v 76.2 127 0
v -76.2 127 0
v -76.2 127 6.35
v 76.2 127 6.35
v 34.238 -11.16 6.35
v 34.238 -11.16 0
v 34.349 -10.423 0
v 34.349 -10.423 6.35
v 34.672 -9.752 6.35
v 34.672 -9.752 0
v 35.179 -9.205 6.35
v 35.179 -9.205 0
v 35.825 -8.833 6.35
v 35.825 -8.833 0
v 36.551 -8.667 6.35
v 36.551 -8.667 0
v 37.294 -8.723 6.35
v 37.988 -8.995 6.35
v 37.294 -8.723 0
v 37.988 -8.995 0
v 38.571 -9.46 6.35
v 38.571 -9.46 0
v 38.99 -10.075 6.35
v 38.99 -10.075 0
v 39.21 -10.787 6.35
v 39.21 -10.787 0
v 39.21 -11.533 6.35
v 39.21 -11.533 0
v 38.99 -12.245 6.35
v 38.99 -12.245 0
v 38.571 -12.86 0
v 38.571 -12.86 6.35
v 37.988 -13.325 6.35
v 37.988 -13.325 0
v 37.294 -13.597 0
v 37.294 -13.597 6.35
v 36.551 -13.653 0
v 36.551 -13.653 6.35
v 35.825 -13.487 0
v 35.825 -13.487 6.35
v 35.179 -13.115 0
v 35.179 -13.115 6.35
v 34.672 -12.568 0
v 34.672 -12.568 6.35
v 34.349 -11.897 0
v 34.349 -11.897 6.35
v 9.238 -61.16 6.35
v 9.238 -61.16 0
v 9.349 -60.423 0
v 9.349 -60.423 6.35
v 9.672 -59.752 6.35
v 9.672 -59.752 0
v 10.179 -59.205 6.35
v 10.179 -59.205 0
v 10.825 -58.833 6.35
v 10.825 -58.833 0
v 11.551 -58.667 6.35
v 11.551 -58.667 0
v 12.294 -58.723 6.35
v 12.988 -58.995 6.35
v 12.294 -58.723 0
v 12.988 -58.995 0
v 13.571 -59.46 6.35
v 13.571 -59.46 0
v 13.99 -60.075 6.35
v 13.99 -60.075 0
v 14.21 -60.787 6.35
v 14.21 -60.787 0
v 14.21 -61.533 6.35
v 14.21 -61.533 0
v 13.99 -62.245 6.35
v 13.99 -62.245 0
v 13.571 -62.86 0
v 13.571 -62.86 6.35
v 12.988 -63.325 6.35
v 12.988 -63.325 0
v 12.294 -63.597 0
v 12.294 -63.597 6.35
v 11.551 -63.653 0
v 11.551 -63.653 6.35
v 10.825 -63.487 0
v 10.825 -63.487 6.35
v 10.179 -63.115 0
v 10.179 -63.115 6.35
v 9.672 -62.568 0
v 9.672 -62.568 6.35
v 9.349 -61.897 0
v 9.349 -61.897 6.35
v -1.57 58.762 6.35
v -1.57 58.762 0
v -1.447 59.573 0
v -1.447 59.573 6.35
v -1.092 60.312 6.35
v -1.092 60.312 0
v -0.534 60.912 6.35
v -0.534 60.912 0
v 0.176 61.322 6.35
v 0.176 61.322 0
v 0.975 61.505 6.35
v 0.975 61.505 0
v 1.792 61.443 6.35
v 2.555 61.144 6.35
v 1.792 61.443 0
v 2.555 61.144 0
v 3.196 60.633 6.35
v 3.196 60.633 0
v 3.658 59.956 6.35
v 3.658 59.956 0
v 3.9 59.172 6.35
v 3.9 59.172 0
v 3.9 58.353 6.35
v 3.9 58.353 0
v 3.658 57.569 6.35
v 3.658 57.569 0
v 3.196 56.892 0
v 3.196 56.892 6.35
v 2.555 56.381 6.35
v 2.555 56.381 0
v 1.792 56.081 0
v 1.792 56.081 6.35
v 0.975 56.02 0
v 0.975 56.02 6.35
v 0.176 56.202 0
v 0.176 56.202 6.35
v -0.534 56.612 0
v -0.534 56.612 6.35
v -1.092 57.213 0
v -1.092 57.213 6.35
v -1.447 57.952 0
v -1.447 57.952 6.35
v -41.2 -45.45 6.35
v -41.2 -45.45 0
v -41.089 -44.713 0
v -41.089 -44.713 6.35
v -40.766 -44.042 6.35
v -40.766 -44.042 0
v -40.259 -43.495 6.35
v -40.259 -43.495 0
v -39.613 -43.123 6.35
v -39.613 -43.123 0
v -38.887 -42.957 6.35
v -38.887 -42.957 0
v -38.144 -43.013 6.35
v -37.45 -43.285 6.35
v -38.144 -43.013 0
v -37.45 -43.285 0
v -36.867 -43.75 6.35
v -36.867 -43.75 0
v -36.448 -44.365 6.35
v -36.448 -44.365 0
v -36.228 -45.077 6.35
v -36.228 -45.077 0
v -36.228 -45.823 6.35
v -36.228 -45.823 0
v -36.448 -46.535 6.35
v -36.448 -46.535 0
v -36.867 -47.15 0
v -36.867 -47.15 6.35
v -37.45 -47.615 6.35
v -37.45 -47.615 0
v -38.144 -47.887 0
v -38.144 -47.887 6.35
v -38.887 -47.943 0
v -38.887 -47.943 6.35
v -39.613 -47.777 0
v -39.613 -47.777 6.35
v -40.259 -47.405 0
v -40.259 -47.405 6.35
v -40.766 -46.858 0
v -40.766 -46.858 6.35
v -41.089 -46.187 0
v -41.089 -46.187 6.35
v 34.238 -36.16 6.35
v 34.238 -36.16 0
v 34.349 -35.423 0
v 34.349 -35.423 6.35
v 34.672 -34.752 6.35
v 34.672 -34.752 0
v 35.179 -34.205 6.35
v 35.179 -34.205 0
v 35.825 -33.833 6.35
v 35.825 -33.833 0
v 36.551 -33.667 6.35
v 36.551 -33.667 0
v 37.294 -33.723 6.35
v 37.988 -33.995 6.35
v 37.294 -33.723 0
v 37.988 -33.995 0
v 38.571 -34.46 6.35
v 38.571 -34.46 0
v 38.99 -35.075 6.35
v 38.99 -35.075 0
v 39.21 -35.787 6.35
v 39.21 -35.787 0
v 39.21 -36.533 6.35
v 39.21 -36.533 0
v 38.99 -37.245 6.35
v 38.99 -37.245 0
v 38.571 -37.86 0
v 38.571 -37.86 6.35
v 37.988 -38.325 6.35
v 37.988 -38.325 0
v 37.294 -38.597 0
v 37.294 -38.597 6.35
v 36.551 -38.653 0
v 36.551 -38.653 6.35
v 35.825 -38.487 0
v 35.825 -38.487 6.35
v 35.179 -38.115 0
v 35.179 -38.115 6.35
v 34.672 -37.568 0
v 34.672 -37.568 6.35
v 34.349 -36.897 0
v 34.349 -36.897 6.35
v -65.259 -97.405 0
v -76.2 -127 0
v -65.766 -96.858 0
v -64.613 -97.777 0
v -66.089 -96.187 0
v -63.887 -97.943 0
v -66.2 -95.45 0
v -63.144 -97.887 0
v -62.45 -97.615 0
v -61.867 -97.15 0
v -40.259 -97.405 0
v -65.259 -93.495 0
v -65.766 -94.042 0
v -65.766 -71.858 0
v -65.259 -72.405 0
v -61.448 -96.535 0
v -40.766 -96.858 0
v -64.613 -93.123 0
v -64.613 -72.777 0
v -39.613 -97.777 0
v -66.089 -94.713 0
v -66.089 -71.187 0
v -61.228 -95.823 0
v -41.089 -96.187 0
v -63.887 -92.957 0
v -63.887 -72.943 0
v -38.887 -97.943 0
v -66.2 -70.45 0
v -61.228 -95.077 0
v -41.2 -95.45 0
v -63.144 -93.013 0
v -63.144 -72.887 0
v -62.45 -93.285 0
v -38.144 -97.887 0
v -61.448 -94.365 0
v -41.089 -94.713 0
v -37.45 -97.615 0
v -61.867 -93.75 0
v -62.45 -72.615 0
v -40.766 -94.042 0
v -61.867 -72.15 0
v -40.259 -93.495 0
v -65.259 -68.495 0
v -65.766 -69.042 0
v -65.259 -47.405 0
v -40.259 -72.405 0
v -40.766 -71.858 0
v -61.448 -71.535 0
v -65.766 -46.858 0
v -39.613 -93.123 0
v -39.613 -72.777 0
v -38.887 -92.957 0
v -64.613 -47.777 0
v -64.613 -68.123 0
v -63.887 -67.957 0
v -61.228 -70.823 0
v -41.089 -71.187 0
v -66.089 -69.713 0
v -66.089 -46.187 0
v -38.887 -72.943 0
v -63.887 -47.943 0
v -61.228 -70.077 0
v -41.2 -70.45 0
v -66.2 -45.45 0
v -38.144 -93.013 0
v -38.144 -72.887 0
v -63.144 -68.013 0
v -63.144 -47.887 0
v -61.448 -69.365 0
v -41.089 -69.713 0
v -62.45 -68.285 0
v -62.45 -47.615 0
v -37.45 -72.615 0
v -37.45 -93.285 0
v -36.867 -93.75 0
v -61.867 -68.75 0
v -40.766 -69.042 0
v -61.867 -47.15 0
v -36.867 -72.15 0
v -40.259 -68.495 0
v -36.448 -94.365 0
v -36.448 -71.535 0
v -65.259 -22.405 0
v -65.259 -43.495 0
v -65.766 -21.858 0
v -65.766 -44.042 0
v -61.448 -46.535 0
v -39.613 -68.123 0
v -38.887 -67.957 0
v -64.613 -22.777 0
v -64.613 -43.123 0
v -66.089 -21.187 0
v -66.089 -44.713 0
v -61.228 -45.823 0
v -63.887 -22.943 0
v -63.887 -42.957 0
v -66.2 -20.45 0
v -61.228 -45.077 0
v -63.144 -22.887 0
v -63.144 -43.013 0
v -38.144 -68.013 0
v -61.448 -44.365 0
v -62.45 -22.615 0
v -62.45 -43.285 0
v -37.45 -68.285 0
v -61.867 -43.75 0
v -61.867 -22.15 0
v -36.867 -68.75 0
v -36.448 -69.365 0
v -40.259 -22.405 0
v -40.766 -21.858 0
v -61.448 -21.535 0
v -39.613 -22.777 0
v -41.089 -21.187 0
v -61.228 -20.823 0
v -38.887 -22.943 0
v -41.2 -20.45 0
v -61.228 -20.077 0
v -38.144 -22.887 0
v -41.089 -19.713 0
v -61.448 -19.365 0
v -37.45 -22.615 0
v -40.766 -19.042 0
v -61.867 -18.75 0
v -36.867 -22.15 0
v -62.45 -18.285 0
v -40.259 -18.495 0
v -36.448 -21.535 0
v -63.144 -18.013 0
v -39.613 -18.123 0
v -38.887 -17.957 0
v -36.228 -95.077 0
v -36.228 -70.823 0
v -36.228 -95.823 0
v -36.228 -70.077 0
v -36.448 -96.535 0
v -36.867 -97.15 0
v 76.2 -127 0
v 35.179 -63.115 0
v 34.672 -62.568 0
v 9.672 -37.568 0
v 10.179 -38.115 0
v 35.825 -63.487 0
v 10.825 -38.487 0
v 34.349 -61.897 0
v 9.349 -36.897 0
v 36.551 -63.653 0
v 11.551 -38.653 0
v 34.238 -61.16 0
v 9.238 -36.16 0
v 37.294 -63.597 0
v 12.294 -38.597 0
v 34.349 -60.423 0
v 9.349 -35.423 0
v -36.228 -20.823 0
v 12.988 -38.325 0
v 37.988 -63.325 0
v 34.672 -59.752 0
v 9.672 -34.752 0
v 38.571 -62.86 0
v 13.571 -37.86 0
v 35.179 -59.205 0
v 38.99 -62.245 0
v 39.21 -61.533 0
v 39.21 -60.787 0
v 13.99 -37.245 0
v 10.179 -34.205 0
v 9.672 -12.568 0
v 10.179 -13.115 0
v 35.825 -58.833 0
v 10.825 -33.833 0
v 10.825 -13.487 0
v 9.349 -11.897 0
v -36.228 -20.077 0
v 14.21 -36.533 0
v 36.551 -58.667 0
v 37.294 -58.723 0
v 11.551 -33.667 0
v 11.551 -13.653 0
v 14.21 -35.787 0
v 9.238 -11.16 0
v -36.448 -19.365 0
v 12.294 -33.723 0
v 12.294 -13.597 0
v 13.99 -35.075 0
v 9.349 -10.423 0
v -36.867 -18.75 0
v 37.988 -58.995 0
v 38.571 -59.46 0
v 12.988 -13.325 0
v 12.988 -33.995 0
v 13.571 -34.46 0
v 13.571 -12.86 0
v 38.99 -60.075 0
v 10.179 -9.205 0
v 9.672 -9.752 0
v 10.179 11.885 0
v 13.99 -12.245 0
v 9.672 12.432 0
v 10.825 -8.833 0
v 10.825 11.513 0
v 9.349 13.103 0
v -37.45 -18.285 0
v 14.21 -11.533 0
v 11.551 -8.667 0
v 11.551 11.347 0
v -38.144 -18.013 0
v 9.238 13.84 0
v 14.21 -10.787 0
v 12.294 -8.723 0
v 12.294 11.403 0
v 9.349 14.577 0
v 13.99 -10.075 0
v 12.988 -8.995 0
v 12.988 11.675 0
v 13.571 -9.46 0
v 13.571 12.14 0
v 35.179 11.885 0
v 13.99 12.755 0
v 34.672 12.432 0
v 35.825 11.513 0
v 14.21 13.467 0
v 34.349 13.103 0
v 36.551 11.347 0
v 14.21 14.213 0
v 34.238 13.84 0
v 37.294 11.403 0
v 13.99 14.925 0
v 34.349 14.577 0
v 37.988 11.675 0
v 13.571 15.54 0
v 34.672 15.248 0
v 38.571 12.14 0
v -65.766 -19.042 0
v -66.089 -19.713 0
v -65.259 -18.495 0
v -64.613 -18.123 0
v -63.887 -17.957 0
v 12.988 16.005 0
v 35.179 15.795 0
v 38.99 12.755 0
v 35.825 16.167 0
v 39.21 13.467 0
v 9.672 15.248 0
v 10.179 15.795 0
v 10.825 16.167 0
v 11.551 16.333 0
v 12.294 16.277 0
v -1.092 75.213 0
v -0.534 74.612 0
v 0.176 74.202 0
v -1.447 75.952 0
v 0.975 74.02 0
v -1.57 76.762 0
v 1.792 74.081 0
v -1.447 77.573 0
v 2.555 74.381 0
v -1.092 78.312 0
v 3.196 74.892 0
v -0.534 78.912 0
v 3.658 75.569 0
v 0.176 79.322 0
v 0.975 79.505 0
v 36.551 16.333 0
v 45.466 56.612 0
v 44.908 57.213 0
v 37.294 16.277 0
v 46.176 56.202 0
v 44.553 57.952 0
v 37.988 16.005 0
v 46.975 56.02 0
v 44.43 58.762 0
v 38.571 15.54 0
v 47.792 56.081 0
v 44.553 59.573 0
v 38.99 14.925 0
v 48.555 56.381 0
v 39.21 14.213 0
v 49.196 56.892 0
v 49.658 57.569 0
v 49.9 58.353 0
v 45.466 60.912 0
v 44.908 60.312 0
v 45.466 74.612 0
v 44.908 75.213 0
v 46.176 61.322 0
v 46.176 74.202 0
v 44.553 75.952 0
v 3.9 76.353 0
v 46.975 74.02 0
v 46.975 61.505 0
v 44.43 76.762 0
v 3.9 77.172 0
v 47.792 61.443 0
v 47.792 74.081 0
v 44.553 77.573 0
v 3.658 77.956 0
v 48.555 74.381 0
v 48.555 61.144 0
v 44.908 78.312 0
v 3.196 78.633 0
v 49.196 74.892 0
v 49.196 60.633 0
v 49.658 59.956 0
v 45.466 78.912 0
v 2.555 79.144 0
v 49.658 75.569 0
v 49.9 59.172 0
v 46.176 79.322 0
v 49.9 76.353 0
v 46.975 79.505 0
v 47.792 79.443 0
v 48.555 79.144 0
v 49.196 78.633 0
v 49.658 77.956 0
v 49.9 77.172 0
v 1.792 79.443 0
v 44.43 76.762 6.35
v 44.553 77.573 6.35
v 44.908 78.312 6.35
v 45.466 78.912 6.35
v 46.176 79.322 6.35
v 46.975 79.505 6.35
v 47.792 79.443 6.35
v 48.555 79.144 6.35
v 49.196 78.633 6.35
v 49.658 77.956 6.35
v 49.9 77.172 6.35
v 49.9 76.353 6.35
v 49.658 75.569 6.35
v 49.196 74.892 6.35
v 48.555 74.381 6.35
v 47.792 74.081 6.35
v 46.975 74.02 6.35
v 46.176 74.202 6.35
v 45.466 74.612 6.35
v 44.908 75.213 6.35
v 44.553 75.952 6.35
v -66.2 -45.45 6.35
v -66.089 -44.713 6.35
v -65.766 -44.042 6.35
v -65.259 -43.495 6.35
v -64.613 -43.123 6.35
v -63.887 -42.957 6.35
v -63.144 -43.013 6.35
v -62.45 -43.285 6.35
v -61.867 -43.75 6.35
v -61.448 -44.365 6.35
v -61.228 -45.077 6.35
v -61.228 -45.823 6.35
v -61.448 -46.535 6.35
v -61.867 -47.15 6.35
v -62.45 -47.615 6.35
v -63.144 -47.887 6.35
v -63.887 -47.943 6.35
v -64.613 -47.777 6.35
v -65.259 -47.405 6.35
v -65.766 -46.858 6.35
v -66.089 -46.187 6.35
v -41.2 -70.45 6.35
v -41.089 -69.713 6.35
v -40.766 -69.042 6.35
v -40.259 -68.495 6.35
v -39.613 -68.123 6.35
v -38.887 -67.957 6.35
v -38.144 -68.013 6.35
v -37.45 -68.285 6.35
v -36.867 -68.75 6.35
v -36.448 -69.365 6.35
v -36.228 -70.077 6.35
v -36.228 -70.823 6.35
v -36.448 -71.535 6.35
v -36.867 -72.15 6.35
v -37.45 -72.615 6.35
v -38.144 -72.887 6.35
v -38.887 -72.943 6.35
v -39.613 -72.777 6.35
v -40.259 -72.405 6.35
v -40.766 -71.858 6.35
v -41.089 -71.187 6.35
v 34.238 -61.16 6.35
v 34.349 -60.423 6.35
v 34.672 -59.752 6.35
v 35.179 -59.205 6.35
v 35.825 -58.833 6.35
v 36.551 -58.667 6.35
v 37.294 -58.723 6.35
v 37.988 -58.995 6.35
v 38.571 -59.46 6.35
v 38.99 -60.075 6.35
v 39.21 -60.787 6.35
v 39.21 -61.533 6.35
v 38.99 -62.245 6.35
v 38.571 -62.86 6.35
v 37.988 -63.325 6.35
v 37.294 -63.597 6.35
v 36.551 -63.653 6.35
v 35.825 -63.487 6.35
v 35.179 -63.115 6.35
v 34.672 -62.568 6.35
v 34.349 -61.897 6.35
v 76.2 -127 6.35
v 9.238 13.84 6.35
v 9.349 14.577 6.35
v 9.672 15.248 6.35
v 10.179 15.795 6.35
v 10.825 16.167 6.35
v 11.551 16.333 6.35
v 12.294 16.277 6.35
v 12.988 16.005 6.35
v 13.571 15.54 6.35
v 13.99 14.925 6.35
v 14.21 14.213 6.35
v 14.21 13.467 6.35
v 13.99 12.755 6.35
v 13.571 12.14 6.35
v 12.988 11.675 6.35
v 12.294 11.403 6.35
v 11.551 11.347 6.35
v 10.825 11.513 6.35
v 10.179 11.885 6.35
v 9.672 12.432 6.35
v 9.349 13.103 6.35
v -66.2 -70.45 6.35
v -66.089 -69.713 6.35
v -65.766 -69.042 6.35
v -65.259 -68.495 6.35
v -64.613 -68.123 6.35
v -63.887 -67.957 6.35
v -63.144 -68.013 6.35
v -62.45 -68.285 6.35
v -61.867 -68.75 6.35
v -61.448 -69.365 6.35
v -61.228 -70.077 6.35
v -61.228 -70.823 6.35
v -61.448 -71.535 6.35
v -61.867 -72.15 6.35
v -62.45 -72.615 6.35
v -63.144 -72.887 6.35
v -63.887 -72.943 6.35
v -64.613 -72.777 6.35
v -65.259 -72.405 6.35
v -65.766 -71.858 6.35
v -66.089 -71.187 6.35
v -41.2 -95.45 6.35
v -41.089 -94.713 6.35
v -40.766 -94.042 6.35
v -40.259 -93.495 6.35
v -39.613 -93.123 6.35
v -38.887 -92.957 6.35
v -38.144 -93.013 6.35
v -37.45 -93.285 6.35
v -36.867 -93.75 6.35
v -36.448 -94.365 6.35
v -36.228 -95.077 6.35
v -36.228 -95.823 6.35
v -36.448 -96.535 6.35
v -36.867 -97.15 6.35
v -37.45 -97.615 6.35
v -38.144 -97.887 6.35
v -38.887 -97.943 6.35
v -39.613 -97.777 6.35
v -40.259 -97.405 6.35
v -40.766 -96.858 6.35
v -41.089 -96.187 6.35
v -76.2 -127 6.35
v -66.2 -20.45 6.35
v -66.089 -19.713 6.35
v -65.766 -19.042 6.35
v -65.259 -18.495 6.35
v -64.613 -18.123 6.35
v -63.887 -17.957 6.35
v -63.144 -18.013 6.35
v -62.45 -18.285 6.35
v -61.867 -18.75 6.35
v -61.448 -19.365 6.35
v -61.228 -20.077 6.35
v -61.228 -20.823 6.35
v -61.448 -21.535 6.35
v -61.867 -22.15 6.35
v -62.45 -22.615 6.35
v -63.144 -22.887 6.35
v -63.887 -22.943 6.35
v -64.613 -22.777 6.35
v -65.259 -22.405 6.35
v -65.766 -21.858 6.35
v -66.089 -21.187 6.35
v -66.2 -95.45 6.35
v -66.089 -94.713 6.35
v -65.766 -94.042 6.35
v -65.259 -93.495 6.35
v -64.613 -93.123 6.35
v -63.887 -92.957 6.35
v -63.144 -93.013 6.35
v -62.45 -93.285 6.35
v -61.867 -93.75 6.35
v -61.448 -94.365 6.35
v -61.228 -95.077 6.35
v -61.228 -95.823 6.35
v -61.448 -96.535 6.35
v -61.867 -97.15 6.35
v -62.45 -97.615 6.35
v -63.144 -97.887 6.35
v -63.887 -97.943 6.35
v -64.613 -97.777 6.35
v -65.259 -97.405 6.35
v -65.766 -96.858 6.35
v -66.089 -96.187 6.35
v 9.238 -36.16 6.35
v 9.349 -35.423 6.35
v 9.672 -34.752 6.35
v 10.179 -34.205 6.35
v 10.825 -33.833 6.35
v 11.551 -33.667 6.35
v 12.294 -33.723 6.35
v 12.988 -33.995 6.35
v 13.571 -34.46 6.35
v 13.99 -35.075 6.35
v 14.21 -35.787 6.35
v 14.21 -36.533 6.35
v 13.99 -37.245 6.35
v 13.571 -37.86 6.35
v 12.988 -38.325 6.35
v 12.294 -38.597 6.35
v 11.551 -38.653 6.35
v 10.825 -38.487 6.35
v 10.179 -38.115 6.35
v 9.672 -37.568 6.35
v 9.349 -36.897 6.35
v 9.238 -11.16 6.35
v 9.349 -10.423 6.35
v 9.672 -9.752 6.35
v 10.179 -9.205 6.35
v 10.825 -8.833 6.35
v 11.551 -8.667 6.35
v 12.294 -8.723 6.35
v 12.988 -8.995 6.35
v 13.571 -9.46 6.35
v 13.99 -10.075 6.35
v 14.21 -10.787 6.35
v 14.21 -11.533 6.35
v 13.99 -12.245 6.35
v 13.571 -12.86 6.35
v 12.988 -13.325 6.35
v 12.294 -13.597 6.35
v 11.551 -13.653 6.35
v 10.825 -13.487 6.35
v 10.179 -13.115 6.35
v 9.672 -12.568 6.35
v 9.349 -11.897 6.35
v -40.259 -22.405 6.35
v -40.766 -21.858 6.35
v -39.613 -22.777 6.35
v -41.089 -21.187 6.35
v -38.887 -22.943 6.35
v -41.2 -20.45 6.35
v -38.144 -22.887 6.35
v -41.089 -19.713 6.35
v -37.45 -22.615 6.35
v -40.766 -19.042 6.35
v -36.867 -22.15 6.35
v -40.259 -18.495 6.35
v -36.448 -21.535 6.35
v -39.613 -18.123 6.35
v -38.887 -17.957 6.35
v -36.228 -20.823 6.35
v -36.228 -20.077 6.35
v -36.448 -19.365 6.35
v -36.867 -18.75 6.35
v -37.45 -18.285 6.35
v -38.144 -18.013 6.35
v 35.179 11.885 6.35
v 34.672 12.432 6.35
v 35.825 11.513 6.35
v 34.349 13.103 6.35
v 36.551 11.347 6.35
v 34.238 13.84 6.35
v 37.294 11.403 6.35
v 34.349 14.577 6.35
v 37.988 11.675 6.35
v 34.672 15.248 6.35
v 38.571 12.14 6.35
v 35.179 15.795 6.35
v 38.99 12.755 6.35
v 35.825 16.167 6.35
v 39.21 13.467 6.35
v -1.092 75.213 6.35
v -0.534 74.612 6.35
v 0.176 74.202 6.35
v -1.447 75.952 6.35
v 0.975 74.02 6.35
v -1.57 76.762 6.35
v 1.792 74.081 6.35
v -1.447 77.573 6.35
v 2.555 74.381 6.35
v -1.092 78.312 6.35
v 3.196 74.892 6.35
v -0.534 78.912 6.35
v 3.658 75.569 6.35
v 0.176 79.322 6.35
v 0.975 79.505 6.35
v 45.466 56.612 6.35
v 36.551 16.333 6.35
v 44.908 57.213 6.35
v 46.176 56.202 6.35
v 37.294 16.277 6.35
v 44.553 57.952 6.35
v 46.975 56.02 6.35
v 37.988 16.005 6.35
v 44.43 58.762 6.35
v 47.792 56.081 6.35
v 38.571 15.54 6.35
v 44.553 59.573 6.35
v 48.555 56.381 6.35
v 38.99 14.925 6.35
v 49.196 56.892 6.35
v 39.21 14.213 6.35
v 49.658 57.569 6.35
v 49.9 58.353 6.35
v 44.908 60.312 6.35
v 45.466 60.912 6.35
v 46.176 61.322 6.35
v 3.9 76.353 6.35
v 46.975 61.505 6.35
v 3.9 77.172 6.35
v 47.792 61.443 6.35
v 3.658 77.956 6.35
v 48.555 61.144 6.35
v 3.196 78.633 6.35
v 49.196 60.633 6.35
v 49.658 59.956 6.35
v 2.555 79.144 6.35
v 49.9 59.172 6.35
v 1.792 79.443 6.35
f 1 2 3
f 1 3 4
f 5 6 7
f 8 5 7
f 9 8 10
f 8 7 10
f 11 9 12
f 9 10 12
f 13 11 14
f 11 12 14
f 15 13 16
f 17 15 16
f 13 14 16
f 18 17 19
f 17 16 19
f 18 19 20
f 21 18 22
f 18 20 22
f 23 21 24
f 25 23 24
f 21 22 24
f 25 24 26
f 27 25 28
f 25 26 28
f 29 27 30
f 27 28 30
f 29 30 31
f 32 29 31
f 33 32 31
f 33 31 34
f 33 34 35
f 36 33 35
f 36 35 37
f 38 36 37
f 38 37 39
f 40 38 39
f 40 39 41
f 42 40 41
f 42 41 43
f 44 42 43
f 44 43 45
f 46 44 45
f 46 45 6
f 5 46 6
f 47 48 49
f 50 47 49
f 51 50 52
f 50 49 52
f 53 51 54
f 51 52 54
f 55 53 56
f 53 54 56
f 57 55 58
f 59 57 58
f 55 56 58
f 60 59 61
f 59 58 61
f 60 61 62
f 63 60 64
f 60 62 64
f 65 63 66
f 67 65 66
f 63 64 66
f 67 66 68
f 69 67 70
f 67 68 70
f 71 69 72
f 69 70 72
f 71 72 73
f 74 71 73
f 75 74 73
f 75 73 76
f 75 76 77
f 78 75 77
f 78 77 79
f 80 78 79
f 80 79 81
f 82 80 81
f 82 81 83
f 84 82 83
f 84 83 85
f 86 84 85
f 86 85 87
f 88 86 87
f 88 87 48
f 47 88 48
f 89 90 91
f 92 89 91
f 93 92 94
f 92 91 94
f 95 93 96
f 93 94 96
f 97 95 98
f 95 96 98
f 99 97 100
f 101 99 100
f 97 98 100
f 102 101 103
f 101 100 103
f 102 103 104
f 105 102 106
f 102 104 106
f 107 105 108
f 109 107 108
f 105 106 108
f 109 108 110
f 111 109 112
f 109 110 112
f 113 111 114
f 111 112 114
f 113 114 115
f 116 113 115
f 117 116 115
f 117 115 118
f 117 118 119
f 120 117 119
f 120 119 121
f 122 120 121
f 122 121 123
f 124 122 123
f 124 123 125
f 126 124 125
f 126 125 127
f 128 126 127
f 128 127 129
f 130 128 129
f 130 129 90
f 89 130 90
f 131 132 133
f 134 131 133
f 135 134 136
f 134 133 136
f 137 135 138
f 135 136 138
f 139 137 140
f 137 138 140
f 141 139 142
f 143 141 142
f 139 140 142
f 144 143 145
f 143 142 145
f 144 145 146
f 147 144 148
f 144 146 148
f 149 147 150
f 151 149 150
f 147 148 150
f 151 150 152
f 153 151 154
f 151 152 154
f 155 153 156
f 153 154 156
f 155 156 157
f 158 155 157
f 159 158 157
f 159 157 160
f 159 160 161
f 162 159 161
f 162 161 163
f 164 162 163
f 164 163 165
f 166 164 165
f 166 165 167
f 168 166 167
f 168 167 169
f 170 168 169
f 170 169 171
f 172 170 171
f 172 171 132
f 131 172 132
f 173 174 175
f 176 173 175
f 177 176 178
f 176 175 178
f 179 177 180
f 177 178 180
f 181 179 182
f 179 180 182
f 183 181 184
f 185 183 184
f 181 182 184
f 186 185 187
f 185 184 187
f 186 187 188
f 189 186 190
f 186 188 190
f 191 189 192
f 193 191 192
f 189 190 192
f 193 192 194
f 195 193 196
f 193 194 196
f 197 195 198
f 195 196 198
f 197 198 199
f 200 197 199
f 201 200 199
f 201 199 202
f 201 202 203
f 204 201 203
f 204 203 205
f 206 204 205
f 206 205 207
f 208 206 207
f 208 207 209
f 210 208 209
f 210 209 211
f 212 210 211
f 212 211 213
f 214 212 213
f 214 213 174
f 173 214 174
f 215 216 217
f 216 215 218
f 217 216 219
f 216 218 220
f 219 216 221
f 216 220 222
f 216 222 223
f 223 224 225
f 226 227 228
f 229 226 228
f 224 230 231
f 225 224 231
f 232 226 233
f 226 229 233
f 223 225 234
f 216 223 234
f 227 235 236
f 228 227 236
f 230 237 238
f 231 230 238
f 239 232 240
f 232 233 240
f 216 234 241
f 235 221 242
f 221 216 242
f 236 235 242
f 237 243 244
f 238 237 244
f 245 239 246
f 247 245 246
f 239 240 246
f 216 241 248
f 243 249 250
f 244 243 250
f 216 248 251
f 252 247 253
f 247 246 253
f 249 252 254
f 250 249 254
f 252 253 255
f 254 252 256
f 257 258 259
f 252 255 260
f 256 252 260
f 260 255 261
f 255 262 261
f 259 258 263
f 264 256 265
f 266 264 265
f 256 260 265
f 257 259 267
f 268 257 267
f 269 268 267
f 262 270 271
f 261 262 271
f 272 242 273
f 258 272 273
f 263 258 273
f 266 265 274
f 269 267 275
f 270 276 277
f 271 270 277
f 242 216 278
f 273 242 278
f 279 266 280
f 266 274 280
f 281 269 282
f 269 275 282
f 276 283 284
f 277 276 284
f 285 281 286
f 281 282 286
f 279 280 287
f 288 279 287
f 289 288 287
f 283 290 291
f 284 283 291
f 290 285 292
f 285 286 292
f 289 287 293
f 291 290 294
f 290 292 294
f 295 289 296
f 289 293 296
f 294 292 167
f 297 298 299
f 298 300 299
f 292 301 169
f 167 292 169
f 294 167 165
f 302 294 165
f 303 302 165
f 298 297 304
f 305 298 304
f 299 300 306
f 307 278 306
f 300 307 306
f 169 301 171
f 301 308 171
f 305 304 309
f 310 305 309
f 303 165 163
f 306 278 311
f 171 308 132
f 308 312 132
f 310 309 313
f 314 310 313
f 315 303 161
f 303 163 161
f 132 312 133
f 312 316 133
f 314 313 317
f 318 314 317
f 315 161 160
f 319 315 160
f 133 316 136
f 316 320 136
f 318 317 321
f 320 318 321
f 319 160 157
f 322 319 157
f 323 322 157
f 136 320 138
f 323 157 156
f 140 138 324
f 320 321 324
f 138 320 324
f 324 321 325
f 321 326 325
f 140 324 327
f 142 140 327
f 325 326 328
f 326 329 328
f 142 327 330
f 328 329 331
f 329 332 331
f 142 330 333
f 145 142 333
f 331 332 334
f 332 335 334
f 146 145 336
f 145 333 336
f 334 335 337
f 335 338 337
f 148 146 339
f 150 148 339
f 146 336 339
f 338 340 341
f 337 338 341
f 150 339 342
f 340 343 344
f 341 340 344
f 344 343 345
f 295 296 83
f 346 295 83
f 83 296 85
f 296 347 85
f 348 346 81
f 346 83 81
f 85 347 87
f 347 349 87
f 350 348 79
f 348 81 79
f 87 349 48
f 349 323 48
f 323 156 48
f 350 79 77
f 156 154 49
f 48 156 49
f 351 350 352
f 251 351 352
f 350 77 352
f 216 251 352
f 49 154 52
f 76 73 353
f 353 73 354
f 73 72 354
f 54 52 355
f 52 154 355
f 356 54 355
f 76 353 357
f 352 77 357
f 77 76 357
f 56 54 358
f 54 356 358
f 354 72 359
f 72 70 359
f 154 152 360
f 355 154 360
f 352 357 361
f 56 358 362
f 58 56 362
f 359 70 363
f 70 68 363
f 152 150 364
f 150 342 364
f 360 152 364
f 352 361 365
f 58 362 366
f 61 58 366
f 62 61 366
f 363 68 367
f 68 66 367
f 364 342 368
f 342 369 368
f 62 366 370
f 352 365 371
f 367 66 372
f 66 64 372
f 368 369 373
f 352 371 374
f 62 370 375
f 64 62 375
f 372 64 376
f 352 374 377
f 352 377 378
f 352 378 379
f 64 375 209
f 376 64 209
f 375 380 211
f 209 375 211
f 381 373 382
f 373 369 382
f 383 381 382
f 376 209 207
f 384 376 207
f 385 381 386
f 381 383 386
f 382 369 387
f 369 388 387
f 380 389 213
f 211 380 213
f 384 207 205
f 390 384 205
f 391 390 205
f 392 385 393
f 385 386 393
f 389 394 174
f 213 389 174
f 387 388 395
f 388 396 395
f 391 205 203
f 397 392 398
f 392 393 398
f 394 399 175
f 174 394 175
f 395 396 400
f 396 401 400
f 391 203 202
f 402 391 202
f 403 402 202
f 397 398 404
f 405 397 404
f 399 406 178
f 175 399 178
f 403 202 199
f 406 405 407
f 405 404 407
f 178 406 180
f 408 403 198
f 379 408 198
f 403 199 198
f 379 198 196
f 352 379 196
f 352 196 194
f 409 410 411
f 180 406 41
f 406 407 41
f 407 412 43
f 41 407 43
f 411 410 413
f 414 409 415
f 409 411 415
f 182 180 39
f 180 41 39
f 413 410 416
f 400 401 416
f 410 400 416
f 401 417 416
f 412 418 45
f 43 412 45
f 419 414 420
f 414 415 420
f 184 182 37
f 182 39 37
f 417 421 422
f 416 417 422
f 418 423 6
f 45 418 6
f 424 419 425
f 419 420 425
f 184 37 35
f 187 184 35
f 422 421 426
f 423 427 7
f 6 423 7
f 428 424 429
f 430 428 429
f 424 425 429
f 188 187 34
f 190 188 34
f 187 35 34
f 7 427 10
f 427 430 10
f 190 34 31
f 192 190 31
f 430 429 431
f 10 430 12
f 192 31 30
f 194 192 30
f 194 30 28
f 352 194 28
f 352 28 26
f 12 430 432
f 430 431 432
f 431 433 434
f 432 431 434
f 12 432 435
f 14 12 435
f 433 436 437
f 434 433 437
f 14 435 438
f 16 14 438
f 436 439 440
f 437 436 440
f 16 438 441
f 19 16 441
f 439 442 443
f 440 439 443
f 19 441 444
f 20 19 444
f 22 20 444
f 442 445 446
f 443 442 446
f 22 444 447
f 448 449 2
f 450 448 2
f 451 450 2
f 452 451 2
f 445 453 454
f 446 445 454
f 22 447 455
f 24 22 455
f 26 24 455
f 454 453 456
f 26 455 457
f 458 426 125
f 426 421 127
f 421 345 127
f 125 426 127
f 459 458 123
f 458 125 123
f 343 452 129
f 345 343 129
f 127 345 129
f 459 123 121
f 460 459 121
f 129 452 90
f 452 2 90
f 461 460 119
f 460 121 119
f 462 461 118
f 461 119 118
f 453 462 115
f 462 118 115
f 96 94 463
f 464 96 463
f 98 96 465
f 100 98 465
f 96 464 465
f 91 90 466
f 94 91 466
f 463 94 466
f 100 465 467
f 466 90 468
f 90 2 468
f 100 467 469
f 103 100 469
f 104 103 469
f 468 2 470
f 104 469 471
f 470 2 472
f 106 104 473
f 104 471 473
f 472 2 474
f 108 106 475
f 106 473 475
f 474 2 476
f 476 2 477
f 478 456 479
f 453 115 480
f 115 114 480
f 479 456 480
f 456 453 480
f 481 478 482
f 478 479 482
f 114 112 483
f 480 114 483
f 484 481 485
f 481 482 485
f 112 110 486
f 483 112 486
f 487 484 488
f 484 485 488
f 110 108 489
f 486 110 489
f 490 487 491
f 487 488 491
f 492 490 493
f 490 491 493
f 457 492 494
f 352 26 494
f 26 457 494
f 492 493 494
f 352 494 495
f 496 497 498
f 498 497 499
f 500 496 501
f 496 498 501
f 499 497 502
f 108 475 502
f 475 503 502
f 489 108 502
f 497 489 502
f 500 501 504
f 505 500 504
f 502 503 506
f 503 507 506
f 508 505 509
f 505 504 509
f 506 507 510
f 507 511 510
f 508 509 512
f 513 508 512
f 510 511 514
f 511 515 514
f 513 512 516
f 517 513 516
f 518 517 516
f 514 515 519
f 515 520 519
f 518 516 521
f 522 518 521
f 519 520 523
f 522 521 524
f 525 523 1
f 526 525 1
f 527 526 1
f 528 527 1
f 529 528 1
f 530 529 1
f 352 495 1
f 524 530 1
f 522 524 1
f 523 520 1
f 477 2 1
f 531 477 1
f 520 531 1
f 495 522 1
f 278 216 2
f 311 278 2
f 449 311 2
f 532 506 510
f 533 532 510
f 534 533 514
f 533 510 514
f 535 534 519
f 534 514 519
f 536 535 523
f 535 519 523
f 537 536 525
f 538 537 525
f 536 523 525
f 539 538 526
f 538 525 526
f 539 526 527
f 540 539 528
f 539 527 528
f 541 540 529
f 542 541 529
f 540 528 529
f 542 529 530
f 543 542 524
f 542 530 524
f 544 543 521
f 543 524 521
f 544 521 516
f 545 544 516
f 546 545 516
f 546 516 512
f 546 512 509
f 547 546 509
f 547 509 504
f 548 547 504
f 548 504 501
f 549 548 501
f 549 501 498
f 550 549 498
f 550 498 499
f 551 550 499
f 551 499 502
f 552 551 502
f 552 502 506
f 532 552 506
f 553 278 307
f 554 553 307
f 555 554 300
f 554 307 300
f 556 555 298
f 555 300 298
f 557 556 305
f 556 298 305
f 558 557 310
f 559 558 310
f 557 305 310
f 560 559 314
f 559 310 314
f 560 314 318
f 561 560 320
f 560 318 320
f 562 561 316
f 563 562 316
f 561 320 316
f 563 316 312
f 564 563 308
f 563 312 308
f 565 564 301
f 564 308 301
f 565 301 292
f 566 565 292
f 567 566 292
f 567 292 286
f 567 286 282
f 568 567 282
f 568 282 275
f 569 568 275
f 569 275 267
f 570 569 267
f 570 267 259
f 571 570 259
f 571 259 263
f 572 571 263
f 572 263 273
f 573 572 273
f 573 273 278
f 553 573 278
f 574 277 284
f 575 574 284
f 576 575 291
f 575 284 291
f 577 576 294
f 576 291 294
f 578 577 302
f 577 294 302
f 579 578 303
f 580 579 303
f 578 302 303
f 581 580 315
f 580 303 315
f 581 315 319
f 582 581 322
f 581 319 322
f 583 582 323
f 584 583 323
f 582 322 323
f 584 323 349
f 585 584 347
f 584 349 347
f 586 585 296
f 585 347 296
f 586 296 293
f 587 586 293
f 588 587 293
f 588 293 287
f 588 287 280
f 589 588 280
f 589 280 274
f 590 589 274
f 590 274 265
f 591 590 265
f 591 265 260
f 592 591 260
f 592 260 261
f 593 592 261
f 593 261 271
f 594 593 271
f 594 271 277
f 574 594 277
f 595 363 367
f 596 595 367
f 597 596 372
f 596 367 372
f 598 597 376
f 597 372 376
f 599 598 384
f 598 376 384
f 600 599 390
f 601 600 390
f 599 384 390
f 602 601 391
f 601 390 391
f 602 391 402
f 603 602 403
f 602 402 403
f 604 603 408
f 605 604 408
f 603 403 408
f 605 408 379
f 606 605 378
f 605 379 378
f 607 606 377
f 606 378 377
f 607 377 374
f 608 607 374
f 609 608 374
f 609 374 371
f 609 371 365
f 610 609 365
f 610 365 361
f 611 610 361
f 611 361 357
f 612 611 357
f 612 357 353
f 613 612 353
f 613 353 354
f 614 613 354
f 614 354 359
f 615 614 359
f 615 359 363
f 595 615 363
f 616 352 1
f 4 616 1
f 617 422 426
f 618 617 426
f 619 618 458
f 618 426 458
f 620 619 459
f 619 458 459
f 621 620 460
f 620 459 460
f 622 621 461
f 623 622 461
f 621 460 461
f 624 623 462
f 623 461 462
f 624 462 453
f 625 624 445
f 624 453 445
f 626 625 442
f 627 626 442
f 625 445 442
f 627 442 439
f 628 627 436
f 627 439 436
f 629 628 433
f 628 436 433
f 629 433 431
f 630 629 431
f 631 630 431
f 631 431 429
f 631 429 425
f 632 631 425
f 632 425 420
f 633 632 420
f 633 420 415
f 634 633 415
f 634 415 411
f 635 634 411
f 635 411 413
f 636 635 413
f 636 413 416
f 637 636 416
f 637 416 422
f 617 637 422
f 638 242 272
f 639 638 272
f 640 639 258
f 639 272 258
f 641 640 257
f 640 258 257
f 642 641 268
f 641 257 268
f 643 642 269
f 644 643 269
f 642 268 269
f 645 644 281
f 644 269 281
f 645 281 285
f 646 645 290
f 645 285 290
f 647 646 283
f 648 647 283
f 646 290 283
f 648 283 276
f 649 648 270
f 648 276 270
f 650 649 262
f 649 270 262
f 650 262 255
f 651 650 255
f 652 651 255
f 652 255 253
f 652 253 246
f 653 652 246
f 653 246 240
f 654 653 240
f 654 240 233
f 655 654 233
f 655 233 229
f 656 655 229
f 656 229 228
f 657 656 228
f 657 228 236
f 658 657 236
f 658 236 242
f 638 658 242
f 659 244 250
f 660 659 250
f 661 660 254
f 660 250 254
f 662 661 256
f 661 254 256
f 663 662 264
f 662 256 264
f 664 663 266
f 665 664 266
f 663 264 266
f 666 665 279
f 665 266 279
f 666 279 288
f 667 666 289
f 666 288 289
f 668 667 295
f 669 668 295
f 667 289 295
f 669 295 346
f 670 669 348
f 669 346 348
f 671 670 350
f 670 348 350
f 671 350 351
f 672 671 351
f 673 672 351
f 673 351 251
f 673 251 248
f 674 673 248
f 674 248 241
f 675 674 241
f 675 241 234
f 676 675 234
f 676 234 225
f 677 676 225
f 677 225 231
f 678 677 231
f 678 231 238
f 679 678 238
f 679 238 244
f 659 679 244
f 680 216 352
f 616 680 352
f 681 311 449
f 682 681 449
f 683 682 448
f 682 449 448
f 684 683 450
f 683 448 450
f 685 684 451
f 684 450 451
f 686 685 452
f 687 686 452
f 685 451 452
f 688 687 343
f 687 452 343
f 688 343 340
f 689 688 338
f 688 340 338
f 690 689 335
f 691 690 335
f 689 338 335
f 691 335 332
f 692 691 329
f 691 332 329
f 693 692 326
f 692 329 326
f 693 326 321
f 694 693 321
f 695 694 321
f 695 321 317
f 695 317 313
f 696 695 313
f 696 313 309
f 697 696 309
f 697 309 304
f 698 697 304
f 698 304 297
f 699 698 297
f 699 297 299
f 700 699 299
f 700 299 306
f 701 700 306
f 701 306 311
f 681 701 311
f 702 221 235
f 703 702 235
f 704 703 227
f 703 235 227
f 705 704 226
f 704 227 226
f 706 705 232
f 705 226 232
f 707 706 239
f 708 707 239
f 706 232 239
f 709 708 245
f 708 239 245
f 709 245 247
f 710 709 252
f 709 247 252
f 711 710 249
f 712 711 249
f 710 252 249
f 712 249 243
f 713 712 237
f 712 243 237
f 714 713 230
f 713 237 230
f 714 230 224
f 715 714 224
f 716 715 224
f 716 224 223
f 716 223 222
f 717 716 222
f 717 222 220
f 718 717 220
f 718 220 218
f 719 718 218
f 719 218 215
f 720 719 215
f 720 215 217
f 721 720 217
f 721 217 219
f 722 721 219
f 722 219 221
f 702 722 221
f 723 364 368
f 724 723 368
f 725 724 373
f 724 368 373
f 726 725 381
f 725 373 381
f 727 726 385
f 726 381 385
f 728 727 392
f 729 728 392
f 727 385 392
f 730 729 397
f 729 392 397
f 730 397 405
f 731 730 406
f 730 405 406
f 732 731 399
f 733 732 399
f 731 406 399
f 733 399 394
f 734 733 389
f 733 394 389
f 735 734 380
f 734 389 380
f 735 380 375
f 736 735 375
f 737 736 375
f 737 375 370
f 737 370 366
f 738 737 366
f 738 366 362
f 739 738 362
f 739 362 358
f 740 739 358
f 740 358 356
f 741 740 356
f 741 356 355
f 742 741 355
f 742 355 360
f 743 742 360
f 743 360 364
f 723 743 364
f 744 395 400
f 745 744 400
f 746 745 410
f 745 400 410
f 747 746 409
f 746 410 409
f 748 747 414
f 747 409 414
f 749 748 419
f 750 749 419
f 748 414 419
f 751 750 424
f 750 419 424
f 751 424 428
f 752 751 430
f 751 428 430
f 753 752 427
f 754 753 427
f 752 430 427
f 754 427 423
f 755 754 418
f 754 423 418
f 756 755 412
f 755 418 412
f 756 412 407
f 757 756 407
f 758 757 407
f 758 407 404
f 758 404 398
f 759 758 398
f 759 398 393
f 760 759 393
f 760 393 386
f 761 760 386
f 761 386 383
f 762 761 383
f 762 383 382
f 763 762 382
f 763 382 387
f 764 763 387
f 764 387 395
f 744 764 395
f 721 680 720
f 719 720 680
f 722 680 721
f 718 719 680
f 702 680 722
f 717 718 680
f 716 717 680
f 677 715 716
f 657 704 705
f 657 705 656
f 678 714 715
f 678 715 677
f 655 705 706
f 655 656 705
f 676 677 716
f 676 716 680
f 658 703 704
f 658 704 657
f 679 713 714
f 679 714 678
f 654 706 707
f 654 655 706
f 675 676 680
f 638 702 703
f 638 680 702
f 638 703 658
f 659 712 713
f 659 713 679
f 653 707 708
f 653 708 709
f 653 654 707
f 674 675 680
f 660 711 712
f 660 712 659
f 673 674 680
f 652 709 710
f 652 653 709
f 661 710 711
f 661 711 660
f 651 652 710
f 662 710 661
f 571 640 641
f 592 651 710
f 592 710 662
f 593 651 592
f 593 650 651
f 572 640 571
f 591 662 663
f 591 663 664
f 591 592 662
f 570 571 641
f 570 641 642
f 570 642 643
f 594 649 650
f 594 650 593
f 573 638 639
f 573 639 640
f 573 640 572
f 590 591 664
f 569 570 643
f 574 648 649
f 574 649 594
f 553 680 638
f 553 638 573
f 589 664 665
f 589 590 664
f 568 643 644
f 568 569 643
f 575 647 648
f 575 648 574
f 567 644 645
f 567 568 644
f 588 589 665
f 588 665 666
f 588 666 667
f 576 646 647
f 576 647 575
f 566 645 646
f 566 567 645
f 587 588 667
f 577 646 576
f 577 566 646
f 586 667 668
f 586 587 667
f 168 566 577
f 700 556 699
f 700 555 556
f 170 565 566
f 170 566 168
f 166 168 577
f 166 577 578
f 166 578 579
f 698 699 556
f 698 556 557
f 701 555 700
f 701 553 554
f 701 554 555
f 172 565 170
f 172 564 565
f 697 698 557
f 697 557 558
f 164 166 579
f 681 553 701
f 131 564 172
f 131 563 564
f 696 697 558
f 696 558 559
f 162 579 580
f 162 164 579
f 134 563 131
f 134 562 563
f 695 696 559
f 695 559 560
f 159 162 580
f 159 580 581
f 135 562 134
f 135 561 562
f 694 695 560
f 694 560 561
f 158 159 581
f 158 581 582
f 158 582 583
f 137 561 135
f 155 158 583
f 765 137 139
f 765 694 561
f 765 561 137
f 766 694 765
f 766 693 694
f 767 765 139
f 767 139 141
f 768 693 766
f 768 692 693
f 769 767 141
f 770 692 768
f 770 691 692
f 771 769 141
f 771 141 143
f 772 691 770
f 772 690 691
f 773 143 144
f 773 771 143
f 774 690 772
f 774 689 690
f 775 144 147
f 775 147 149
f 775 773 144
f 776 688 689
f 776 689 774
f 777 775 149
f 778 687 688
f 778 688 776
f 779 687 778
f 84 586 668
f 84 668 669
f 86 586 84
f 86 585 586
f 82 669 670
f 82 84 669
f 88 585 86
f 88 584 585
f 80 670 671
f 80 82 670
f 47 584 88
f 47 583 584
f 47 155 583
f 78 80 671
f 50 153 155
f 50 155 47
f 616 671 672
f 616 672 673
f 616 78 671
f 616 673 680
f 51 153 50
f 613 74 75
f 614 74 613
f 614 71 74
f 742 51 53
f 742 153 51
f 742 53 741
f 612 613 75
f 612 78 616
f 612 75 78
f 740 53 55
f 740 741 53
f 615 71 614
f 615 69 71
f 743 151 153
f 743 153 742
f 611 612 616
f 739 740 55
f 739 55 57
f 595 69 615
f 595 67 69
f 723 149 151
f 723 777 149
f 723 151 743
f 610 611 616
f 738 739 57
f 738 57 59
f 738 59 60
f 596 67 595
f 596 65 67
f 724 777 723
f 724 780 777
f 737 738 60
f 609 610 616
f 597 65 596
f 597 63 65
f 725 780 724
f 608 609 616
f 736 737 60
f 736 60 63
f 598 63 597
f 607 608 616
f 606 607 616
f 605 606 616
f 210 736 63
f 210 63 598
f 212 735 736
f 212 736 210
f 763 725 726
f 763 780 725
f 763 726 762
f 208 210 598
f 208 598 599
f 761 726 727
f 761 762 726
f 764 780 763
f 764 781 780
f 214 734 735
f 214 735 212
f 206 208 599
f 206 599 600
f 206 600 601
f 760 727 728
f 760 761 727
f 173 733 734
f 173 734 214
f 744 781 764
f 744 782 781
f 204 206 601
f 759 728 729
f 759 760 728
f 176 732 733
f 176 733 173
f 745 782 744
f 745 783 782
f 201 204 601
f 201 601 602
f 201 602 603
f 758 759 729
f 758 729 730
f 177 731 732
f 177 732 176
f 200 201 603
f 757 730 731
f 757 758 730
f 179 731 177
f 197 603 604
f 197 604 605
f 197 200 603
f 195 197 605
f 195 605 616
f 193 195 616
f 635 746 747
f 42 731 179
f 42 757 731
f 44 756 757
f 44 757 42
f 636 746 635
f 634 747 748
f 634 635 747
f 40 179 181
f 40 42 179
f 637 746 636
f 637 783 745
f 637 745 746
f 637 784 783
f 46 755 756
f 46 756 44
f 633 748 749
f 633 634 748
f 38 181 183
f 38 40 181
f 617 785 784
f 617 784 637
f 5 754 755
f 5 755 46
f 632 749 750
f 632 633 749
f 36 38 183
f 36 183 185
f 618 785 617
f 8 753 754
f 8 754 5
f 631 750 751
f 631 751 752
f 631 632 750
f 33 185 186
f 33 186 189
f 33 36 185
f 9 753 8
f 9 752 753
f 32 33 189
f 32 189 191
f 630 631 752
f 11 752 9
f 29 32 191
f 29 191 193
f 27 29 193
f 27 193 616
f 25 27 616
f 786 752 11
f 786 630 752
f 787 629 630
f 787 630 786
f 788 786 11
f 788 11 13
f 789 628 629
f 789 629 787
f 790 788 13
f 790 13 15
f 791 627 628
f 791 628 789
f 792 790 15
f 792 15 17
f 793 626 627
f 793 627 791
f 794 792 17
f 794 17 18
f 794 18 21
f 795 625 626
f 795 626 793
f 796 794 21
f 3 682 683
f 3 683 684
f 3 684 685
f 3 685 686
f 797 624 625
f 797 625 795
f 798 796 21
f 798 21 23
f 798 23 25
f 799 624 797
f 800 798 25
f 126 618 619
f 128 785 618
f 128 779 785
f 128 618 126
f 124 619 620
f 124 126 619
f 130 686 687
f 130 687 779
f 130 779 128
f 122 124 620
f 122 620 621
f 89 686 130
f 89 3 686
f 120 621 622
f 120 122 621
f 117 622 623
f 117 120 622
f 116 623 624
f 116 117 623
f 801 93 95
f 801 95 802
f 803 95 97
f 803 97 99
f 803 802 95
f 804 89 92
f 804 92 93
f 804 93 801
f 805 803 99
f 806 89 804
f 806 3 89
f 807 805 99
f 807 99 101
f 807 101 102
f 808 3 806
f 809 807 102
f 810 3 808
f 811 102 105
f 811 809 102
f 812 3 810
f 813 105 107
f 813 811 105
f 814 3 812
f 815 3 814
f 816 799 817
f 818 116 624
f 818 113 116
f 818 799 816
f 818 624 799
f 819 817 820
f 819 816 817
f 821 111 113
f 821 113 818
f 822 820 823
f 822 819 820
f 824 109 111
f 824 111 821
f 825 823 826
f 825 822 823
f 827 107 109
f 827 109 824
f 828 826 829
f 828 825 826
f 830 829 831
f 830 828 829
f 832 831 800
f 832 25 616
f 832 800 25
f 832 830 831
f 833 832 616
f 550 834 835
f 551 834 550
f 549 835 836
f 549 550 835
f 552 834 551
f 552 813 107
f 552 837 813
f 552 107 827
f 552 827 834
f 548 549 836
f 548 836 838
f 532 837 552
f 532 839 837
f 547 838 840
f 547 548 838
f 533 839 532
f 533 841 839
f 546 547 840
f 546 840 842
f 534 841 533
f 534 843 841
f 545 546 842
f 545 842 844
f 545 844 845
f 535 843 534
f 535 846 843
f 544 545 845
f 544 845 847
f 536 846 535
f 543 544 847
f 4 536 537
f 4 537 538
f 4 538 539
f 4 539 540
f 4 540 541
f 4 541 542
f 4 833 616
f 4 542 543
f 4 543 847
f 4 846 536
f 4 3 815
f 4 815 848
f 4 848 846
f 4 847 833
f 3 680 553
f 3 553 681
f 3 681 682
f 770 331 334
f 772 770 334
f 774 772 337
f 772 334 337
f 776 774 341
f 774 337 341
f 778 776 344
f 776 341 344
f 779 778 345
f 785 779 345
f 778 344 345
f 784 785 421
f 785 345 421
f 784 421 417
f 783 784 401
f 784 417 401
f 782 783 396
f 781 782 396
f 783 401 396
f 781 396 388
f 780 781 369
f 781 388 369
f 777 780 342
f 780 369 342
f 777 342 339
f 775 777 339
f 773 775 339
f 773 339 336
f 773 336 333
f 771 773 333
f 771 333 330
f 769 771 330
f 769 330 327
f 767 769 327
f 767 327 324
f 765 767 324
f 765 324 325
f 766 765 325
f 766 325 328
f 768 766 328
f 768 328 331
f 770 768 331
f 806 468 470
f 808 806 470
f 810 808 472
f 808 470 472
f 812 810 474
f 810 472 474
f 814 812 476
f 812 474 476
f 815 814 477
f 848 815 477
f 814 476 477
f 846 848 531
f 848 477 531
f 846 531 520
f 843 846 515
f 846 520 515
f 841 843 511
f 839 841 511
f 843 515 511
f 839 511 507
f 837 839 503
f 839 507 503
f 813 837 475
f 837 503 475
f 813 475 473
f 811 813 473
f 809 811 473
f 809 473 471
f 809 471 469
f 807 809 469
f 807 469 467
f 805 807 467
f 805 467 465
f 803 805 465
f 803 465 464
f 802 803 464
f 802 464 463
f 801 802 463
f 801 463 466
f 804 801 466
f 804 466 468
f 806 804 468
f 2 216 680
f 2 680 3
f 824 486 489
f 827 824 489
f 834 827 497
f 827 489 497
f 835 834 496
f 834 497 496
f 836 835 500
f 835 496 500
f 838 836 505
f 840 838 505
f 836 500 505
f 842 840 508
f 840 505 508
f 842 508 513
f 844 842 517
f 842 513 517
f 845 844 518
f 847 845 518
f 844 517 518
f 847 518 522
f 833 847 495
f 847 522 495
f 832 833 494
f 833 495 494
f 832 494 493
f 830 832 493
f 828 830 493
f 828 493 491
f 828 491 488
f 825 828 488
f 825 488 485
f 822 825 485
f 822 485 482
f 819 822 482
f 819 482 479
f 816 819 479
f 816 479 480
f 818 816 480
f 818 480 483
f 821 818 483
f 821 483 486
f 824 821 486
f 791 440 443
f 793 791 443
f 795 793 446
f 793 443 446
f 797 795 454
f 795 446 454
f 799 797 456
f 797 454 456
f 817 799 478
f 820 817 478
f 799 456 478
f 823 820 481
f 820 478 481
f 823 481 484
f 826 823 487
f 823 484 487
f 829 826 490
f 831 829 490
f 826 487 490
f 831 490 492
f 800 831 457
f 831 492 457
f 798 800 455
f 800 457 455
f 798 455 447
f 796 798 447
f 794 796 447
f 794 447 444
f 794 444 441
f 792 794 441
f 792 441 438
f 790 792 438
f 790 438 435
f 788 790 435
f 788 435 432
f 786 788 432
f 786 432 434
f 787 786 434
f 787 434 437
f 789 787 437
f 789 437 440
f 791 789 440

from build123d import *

# Parameters (mm, degrees)
SKETCH1_W           = 152.4
SKETCH1_H           = 254
BOSS_EXTRUDE1_DEPTH = 6.35
CUT_EXTRUDE2_REACH  = 150.242
SKETCH3_R           = 2.5
CUT_EXTRUDE3_REACH  = 150.242
SKETCH4_R           = 2.75


with BuildPart() as part:
    # Sketch1 → Boss-Extrude1 (new body)
    with BuildSketch(Plane.XY):
        Rectangle(SKETCH1_W, SKETCH1_H)
    extrude(amount=BOSS_EXTRUDE1_DEPTH)

    # Sketch3 → Cut-Extrude2 (cut, up to next)
    with BuildSketch(Plane(origin=(0, 0, 0), x_dir=(-1, 0, 0), z_dir=(0, 0, -1)), mode=Mode.PRIVATE) as cut_extrude2_sk1:
        with Locations((63.7, -20.45)):
            Circle(SKETCH3_R)
    cut_extrude2_tool1 = extrude(cut_extrude2_sk1.sketch, amount=-CUT_EXTRUDE2_REACH, mode=Mode.PRIVATE) & part.part
    # Sketch3 → Cut-Extrude2 (cut, up to next)
    with BuildSketch(Plane(origin=(0, 0, 0), x_dir=(-1, 0, 0), z_dir=(0, 0, -1)), mode=Mode.PRIVATE) as cut_extrude2_sk2:
        with Locations((38.7, -20.45)):
            Circle(SKETCH3_R)
    cut_extrude2_tool2 = extrude(cut_extrude2_sk2.sketch, amount=-CUT_EXTRUDE2_REACH, mode=Mode.PRIVATE) & part.part
    # Sketch3 → Cut-Extrude2 (cut, up to next)
    with BuildSketch(Plane(origin=(0, 0, 0), x_dir=(-1, 0, 0), z_dir=(0, 0, -1)), mode=Mode.PRIVATE) as cut_extrude2_sk3:
        with Locations((38.7, -45.45)):
            Circle(SKETCH3_R)
    cut_extrude2_tool3 = extrude(cut_extrude2_sk3.sketch, amount=-CUT_EXTRUDE2_REACH, mode=Mode.PRIVATE) & part.part
    # Sketch3 → Cut-Extrude2 (cut, up to next)
    with BuildSketch(Plane(origin=(0, 0, 0), x_dir=(-1, 0, 0), z_dir=(0, 0, -1)), mode=Mode.PRIVATE) as cut_extrude2_sk4:
        with Locations((63.7, -45.45)):
            Circle(SKETCH3_R)
    cut_extrude2_tool4 = extrude(cut_extrude2_sk4.sketch, amount=-CUT_EXTRUDE2_REACH, mode=Mode.PRIVATE) & part.part
    # Sketch3 → Cut-Extrude2 (cut, up to next)
    with BuildSketch(Plane(origin=(0, 0, 0), x_dir=(-1, 0, 0), z_dir=(0, 0, -1)), mode=Mode.PRIVATE) as cut_extrude2_sk5:
        with Locations((63.7, -70.45)):
            Circle(SKETCH3_R)
    cut_extrude2_tool5 = extrude(cut_extrude2_sk5.sketch, amount=-CUT_EXTRUDE2_REACH, mode=Mode.PRIVATE) & part.part
    # Sketch3 → Cut-Extrude2 (cut, up to next)
    with BuildSketch(Plane(origin=(0, 0, 0), x_dir=(-1, 0, 0), z_dir=(0, 0, -1)), mode=Mode.PRIVATE) as cut_extrude2_sk6:
        with Locations((38.7, -70.45)):
            Circle(SKETCH3_R)
    cut_extrude2_tool6 = extrude(cut_extrude2_sk6.sketch, amount=-CUT_EXTRUDE2_REACH, mode=Mode.PRIVATE) & part.part
    # Sketch3 → Cut-Extrude2 (cut, up to next)
    with BuildSketch(Plane(origin=(0, 0, 0), x_dir=(-1, 0, 0), z_dir=(0, 0, -1)), mode=Mode.PRIVATE) as cut_extrude2_sk7:
        with Locations((38.7, -95.45)):
            Circle(SKETCH3_R)
    cut_extrude2_tool7 = extrude(cut_extrude2_sk7.sketch, amount=-CUT_EXTRUDE2_REACH, mode=Mode.PRIVATE) & part.part
    # Sketch3 → Cut-Extrude2 (cut, up to next)
    with BuildSketch(Plane(origin=(0, 0, 0), x_dir=(-1, 0, 0), z_dir=(0, 0, -1)), mode=Mode.PRIVATE) as cut_extrude2_sk8:
        with Locations((63.7, -95.45)):
            Circle(SKETCH3_R)
    cut_extrude2_tool8 = extrude(cut_extrude2_sk8.sketch, amount=-CUT_EXTRUDE2_REACH, mode=Mode.PRIVATE) & part.part
    # Sketch3 → Cut-Extrude2 (cut, up to next)
    with BuildSketch(Plane(origin=(0, 0, 0), x_dir=(-1, 0, 0), z_dir=(0, 0, -1)), mode=Mode.PRIVATE) as cut_extrude2_sk9:
        with Locations((-11.738, -61.16)):
            Circle(SKETCH3_R)
    cut_extrude2_tool9 = extrude(cut_extrude2_sk9.sketch, amount=-CUT_EXTRUDE2_REACH, mode=Mode.PRIVATE) & part.part
    # Sketch3 → Cut-Extrude2 (cut, up to next)
    with BuildSketch(Plane(origin=(0, 0, 0), x_dir=(-1, 0, 0), z_dir=(0, 0, -1)), mode=Mode.PRIVATE) as cut_extrude2_sk10:
        with Locations((-11.738, -36.16)):
            Circle(SKETCH3_R)
    cut_extrude2_tool10 = extrude(cut_extrude2_sk10.sketch, amount=-CUT_EXTRUDE2_REACH, mode=Mode.PRIVATE) & part.part
    # Sketch3 → Cut-Extrude2 (cut, up to next)
    with BuildSketch(Plane(origin=(0, 0, 0), x_dir=(-1, 0, 0), z_dir=(0, 0, -1)), mode=Mode.PRIVATE) as cut_extrude2_sk11:
        with Locations((-36.738, -61.16)):
            Circle(SKETCH3_R)
    cut_extrude2_tool11 = extrude(cut_extrude2_sk11.sketch, amount=-CUT_EXTRUDE2_REACH, mode=Mode.PRIVATE) & part.part
    # Sketch3 → Cut-Extrude2 (cut, up to next)
    with BuildSketch(Plane(origin=(0, 0, 0), x_dir=(-1, 0, 0), z_dir=(0, 0, -1)), mode=Mode.PRIVATE) as cut_extrude2_sk12:
        with Locations((-36.738, -36.16)):
            Circle(SKETCH3_R)
    cut_extrude2_tool12 = extrude(cut_extrude2_sk12.sketch, amount=-CUT_EXTRUDE2_REACH, mode=Mode.PRIVATE) & part.part
    # Sketch3 → Cut-Extrude2 (cut, up to next)
    with BuildSketch(Plane(origin=(0, 0, 0), x_dir=(-1, 0, 0), z_dir=(0, 0, -1)), mode=Mode.PRIVATE) as cut_extrude2_sk13:
        with Locations((-11.738, -11.16)):
            Circle(SKETCH3_R)
    cut_extrude2_tool13 = extrude(cut_extrude2_sk13.sketch, amount=-CUT_EXTRUDE2_REACH, mode=Mode.PRIVATE) & part.part
    # Sketch3 → Cut-Extrude2 (cut, up to next)
    with BuildSketch(Plane(origin=(0, 0, 0), x_dir=(-1, 0, 0), z_dir=(0, 0, -1)), mode=Mode.PRIVATE) as cut_extrude2_sk14:
        with Locations((-36.738, -11.16)):
            Circle(SKETCH3_R)
    cut_extrude2_tool14 = extrude(cut_extrude2_sk14.sketch, amount=-CUT_EXTRUDE2_REACH, mode=Mode.PRIVATE) & part.part
    # Sketch3 → Cut-Extrude2 (cut, up to next)
    with BuildSketch(Plane(origin=(0, 0, 0), x_dir=(-1, 0, 0), z_dir=(0, 0, -1)), mode=Mode.PRIVATE) as cut_extrude2_sk15:
        with Locations((-36.738, 13.84)):
            Circle(SKETCH3_R)
    cut_extrude2_tool15 = extrude(cut_extrude2_sk15.sketch, amount=-CUT_EXTRUDE2_REACH, mode=Mode.PRIVATE) & part.part
    # Sketch3 → Cut-Extrude2 (cut, up to next)
    with BuildSketch(Plane(origin=(0, 0, 0), x_dir=(-1, 0, 0), z_dir=(0, 0, -1)), mode=Mode.PRIVATE) as cut_extrude2_sk16:
        with Locations((-11.738, 13.84)):
            Circle(SKETCH3_R)
    cut_extrude2_tool16 = extrude(cut_extrude2_sk16.sketch, amount=-CUT_EXTRUDE2_REACH, mode=Mode.PRIVATE) & part.part
    add(cut_extrude2_tool1.solids().sort_by_distance((-63.7, -20.45, 0))[0], mode=Mode.SUBTRACT)
    add(cut_extrude2_tool2.solids().sort_by_distance((-38.7, -20.45, 0))[0], mode=Mode.SUBTRACT)
    add(cut_extrude2_tool3.solids().sort_by_distance((-38.7, -45.45, 0))[0], mode=Mode.SUBTRACT)
    add(cut_extrude2_tool4.solids().sort_by_distance((-63.7, -45.45, 0))[0], mode=Mode.SUBTRACT)
    add(cut_extrude2_tool5.solids().sort_by_distance((-63.7, -70.45, 0))[0], mode=Mode.SUBTRACT)
    add(cut_extrude2_tool6.solids().sort_by_distance((-38.7, -70.45, 0))[0], mode=Mode.SUBTRACT)
    add(cut_extrude2_tool7.solids().sort_by_distance((-38.7, -95.45, 0))[0], mode=Mode.SUBTRACT)
    add(cut_extrude2_tool8.solids().sort_by_distance((-63.7, -95.45, 0))[0], mode=Mode.SUBTRACT)
    add(cut_extrude2_tool9.solids().sort_by_distance((11.738, -61.16, 0))[0], mode=Mode.SUBTRACT)
    add(cut_extrude2_tool10.solids().sort_by_distance((11.738, -36.16, 0))[0], mode=Mode.SUBTRACT)
    add(cut_extrude2_tool11.solids().sort_by_distance((36.738, -61.16, 0))[0], mode=Mode.SUBTRACT)
    add(cut_extrude2_tool12.solids().sort_by_distance((36.738, -36.16, 0))[0], mode=Mode.SUBTRACT)
    add(cut_extrude2_tool13.solids().sort_by_distance((11.738, -11.16, 0))[0], mode=Mode.SUBTRACT)
    add(cut_extrude2_tool14.solids().sort_by_distance((36.738, -11.16, 0))[0], mode=Mode.SUBTRACT)
    add(cut_extrude2_tool15.solids().sort_by_distance((36.738, 13.84, 0))[0], mode=Mode.SUBTRACT)
    add(cut_extrude2_tool16.solids().sort_by_distance((11.738, 13.84, 0))[0], mode=Mode.SUBTRACT)

    # Sketch4 → Cut-Extrude3 (cut, up to next)
    with BuildSketch(Plane(origin=(0, 0, 0), x_dir=(-1, 0, 0), z_dir=(0, 0, -1)), mode=Mode.PRIVATE) as cut_extrude3_sk1:
        with Locations((-47.180499962, 58.762402402)):
            Circle(SKETCH4_R)
    cut_extrude3_tool1 = extrude(cut_extrude3_sk1.sketch, amount=-CUT_EXTRUDE3_REACH, mode=Mode.PRIVATE) & part.part
    # Sketch4 → Cut-Extrude3 (cut, up to next)
    with BuildSketch(Plane(origin=(0, 0, 0), x_dir=(-1, 0, 0), z_dir=(0, 0, -1)), mode=Mode.PRIVATE) as cut_extrude3_sk2:
        with Locations((-1.180499962, 58.762402402)):
            Circle(SKETCH4_R)
    cut_extrude3_tool2 = extrude(cut_extrude3_sk2.sketch, amount=-CUT_EXTRUDE3_REACH, mode=Mode.PRIVATE) & part.part
    # Sketch4 → Cut-Extrude3 (cut, up to next)
    with BuildSketch(Plane(origin=(0, 0, 0), x_dir=(-1, 0, 0), z_dir=(0, 0, -1)), mode=Mode.PRIVATE) as cut_extrude3_sk3:
        with Locations((-47.180499962, 76.762402402)):
            Circle(SKETCH4_R)
    cut_extrude3_tool3 = extrude(cut_extrude3_sk3.sketch, amount=-CUT_EXTRUDE3_REACH, mode=Mode.PRIVATE) & part.part
    # Sketch4 → Cut-Extrude3 (cut, up to next)
    with BuildSketch(Plane(origin=(0, 0, 0), x_dir=(-1, 0, 0), z_dir=(0, 0, -1)), mode=Mode.PRIVATE) as cut_extrude3_sk4:
        with Locations((-1.180499962, 76.762402402)):
            Circle(SKETCH4_R)
    cut_extrude3_tool4 = extrude(cut_extrude3_sk4.sketch, amount=-CUT_EXTRUDE3_REACH, mode=Mode.PRIVATE) & part.part
    add(cut_extrude3_tool1.solids().sort_by_distance((47.1805, 58.762402, 0))[0], mode=Mode.SUBTRACT)
    add(cut_extrude3_tool2.solids().sort_by_distance((1.1805, 58.762402, 0))[0], mode=Mode.SUBTRACT)
    add(cut_extrude3_tool3.solids().sort_by_distance((47.1805, 76.762402, 0))[0], mode=Mode.SUBTRACT)
    add(cut_extrude3_tool4.solids().sort_by_distance((1.1805, 76.762402, 0))[0], mode=Mode.SUBTRACT)


solid = part.part
